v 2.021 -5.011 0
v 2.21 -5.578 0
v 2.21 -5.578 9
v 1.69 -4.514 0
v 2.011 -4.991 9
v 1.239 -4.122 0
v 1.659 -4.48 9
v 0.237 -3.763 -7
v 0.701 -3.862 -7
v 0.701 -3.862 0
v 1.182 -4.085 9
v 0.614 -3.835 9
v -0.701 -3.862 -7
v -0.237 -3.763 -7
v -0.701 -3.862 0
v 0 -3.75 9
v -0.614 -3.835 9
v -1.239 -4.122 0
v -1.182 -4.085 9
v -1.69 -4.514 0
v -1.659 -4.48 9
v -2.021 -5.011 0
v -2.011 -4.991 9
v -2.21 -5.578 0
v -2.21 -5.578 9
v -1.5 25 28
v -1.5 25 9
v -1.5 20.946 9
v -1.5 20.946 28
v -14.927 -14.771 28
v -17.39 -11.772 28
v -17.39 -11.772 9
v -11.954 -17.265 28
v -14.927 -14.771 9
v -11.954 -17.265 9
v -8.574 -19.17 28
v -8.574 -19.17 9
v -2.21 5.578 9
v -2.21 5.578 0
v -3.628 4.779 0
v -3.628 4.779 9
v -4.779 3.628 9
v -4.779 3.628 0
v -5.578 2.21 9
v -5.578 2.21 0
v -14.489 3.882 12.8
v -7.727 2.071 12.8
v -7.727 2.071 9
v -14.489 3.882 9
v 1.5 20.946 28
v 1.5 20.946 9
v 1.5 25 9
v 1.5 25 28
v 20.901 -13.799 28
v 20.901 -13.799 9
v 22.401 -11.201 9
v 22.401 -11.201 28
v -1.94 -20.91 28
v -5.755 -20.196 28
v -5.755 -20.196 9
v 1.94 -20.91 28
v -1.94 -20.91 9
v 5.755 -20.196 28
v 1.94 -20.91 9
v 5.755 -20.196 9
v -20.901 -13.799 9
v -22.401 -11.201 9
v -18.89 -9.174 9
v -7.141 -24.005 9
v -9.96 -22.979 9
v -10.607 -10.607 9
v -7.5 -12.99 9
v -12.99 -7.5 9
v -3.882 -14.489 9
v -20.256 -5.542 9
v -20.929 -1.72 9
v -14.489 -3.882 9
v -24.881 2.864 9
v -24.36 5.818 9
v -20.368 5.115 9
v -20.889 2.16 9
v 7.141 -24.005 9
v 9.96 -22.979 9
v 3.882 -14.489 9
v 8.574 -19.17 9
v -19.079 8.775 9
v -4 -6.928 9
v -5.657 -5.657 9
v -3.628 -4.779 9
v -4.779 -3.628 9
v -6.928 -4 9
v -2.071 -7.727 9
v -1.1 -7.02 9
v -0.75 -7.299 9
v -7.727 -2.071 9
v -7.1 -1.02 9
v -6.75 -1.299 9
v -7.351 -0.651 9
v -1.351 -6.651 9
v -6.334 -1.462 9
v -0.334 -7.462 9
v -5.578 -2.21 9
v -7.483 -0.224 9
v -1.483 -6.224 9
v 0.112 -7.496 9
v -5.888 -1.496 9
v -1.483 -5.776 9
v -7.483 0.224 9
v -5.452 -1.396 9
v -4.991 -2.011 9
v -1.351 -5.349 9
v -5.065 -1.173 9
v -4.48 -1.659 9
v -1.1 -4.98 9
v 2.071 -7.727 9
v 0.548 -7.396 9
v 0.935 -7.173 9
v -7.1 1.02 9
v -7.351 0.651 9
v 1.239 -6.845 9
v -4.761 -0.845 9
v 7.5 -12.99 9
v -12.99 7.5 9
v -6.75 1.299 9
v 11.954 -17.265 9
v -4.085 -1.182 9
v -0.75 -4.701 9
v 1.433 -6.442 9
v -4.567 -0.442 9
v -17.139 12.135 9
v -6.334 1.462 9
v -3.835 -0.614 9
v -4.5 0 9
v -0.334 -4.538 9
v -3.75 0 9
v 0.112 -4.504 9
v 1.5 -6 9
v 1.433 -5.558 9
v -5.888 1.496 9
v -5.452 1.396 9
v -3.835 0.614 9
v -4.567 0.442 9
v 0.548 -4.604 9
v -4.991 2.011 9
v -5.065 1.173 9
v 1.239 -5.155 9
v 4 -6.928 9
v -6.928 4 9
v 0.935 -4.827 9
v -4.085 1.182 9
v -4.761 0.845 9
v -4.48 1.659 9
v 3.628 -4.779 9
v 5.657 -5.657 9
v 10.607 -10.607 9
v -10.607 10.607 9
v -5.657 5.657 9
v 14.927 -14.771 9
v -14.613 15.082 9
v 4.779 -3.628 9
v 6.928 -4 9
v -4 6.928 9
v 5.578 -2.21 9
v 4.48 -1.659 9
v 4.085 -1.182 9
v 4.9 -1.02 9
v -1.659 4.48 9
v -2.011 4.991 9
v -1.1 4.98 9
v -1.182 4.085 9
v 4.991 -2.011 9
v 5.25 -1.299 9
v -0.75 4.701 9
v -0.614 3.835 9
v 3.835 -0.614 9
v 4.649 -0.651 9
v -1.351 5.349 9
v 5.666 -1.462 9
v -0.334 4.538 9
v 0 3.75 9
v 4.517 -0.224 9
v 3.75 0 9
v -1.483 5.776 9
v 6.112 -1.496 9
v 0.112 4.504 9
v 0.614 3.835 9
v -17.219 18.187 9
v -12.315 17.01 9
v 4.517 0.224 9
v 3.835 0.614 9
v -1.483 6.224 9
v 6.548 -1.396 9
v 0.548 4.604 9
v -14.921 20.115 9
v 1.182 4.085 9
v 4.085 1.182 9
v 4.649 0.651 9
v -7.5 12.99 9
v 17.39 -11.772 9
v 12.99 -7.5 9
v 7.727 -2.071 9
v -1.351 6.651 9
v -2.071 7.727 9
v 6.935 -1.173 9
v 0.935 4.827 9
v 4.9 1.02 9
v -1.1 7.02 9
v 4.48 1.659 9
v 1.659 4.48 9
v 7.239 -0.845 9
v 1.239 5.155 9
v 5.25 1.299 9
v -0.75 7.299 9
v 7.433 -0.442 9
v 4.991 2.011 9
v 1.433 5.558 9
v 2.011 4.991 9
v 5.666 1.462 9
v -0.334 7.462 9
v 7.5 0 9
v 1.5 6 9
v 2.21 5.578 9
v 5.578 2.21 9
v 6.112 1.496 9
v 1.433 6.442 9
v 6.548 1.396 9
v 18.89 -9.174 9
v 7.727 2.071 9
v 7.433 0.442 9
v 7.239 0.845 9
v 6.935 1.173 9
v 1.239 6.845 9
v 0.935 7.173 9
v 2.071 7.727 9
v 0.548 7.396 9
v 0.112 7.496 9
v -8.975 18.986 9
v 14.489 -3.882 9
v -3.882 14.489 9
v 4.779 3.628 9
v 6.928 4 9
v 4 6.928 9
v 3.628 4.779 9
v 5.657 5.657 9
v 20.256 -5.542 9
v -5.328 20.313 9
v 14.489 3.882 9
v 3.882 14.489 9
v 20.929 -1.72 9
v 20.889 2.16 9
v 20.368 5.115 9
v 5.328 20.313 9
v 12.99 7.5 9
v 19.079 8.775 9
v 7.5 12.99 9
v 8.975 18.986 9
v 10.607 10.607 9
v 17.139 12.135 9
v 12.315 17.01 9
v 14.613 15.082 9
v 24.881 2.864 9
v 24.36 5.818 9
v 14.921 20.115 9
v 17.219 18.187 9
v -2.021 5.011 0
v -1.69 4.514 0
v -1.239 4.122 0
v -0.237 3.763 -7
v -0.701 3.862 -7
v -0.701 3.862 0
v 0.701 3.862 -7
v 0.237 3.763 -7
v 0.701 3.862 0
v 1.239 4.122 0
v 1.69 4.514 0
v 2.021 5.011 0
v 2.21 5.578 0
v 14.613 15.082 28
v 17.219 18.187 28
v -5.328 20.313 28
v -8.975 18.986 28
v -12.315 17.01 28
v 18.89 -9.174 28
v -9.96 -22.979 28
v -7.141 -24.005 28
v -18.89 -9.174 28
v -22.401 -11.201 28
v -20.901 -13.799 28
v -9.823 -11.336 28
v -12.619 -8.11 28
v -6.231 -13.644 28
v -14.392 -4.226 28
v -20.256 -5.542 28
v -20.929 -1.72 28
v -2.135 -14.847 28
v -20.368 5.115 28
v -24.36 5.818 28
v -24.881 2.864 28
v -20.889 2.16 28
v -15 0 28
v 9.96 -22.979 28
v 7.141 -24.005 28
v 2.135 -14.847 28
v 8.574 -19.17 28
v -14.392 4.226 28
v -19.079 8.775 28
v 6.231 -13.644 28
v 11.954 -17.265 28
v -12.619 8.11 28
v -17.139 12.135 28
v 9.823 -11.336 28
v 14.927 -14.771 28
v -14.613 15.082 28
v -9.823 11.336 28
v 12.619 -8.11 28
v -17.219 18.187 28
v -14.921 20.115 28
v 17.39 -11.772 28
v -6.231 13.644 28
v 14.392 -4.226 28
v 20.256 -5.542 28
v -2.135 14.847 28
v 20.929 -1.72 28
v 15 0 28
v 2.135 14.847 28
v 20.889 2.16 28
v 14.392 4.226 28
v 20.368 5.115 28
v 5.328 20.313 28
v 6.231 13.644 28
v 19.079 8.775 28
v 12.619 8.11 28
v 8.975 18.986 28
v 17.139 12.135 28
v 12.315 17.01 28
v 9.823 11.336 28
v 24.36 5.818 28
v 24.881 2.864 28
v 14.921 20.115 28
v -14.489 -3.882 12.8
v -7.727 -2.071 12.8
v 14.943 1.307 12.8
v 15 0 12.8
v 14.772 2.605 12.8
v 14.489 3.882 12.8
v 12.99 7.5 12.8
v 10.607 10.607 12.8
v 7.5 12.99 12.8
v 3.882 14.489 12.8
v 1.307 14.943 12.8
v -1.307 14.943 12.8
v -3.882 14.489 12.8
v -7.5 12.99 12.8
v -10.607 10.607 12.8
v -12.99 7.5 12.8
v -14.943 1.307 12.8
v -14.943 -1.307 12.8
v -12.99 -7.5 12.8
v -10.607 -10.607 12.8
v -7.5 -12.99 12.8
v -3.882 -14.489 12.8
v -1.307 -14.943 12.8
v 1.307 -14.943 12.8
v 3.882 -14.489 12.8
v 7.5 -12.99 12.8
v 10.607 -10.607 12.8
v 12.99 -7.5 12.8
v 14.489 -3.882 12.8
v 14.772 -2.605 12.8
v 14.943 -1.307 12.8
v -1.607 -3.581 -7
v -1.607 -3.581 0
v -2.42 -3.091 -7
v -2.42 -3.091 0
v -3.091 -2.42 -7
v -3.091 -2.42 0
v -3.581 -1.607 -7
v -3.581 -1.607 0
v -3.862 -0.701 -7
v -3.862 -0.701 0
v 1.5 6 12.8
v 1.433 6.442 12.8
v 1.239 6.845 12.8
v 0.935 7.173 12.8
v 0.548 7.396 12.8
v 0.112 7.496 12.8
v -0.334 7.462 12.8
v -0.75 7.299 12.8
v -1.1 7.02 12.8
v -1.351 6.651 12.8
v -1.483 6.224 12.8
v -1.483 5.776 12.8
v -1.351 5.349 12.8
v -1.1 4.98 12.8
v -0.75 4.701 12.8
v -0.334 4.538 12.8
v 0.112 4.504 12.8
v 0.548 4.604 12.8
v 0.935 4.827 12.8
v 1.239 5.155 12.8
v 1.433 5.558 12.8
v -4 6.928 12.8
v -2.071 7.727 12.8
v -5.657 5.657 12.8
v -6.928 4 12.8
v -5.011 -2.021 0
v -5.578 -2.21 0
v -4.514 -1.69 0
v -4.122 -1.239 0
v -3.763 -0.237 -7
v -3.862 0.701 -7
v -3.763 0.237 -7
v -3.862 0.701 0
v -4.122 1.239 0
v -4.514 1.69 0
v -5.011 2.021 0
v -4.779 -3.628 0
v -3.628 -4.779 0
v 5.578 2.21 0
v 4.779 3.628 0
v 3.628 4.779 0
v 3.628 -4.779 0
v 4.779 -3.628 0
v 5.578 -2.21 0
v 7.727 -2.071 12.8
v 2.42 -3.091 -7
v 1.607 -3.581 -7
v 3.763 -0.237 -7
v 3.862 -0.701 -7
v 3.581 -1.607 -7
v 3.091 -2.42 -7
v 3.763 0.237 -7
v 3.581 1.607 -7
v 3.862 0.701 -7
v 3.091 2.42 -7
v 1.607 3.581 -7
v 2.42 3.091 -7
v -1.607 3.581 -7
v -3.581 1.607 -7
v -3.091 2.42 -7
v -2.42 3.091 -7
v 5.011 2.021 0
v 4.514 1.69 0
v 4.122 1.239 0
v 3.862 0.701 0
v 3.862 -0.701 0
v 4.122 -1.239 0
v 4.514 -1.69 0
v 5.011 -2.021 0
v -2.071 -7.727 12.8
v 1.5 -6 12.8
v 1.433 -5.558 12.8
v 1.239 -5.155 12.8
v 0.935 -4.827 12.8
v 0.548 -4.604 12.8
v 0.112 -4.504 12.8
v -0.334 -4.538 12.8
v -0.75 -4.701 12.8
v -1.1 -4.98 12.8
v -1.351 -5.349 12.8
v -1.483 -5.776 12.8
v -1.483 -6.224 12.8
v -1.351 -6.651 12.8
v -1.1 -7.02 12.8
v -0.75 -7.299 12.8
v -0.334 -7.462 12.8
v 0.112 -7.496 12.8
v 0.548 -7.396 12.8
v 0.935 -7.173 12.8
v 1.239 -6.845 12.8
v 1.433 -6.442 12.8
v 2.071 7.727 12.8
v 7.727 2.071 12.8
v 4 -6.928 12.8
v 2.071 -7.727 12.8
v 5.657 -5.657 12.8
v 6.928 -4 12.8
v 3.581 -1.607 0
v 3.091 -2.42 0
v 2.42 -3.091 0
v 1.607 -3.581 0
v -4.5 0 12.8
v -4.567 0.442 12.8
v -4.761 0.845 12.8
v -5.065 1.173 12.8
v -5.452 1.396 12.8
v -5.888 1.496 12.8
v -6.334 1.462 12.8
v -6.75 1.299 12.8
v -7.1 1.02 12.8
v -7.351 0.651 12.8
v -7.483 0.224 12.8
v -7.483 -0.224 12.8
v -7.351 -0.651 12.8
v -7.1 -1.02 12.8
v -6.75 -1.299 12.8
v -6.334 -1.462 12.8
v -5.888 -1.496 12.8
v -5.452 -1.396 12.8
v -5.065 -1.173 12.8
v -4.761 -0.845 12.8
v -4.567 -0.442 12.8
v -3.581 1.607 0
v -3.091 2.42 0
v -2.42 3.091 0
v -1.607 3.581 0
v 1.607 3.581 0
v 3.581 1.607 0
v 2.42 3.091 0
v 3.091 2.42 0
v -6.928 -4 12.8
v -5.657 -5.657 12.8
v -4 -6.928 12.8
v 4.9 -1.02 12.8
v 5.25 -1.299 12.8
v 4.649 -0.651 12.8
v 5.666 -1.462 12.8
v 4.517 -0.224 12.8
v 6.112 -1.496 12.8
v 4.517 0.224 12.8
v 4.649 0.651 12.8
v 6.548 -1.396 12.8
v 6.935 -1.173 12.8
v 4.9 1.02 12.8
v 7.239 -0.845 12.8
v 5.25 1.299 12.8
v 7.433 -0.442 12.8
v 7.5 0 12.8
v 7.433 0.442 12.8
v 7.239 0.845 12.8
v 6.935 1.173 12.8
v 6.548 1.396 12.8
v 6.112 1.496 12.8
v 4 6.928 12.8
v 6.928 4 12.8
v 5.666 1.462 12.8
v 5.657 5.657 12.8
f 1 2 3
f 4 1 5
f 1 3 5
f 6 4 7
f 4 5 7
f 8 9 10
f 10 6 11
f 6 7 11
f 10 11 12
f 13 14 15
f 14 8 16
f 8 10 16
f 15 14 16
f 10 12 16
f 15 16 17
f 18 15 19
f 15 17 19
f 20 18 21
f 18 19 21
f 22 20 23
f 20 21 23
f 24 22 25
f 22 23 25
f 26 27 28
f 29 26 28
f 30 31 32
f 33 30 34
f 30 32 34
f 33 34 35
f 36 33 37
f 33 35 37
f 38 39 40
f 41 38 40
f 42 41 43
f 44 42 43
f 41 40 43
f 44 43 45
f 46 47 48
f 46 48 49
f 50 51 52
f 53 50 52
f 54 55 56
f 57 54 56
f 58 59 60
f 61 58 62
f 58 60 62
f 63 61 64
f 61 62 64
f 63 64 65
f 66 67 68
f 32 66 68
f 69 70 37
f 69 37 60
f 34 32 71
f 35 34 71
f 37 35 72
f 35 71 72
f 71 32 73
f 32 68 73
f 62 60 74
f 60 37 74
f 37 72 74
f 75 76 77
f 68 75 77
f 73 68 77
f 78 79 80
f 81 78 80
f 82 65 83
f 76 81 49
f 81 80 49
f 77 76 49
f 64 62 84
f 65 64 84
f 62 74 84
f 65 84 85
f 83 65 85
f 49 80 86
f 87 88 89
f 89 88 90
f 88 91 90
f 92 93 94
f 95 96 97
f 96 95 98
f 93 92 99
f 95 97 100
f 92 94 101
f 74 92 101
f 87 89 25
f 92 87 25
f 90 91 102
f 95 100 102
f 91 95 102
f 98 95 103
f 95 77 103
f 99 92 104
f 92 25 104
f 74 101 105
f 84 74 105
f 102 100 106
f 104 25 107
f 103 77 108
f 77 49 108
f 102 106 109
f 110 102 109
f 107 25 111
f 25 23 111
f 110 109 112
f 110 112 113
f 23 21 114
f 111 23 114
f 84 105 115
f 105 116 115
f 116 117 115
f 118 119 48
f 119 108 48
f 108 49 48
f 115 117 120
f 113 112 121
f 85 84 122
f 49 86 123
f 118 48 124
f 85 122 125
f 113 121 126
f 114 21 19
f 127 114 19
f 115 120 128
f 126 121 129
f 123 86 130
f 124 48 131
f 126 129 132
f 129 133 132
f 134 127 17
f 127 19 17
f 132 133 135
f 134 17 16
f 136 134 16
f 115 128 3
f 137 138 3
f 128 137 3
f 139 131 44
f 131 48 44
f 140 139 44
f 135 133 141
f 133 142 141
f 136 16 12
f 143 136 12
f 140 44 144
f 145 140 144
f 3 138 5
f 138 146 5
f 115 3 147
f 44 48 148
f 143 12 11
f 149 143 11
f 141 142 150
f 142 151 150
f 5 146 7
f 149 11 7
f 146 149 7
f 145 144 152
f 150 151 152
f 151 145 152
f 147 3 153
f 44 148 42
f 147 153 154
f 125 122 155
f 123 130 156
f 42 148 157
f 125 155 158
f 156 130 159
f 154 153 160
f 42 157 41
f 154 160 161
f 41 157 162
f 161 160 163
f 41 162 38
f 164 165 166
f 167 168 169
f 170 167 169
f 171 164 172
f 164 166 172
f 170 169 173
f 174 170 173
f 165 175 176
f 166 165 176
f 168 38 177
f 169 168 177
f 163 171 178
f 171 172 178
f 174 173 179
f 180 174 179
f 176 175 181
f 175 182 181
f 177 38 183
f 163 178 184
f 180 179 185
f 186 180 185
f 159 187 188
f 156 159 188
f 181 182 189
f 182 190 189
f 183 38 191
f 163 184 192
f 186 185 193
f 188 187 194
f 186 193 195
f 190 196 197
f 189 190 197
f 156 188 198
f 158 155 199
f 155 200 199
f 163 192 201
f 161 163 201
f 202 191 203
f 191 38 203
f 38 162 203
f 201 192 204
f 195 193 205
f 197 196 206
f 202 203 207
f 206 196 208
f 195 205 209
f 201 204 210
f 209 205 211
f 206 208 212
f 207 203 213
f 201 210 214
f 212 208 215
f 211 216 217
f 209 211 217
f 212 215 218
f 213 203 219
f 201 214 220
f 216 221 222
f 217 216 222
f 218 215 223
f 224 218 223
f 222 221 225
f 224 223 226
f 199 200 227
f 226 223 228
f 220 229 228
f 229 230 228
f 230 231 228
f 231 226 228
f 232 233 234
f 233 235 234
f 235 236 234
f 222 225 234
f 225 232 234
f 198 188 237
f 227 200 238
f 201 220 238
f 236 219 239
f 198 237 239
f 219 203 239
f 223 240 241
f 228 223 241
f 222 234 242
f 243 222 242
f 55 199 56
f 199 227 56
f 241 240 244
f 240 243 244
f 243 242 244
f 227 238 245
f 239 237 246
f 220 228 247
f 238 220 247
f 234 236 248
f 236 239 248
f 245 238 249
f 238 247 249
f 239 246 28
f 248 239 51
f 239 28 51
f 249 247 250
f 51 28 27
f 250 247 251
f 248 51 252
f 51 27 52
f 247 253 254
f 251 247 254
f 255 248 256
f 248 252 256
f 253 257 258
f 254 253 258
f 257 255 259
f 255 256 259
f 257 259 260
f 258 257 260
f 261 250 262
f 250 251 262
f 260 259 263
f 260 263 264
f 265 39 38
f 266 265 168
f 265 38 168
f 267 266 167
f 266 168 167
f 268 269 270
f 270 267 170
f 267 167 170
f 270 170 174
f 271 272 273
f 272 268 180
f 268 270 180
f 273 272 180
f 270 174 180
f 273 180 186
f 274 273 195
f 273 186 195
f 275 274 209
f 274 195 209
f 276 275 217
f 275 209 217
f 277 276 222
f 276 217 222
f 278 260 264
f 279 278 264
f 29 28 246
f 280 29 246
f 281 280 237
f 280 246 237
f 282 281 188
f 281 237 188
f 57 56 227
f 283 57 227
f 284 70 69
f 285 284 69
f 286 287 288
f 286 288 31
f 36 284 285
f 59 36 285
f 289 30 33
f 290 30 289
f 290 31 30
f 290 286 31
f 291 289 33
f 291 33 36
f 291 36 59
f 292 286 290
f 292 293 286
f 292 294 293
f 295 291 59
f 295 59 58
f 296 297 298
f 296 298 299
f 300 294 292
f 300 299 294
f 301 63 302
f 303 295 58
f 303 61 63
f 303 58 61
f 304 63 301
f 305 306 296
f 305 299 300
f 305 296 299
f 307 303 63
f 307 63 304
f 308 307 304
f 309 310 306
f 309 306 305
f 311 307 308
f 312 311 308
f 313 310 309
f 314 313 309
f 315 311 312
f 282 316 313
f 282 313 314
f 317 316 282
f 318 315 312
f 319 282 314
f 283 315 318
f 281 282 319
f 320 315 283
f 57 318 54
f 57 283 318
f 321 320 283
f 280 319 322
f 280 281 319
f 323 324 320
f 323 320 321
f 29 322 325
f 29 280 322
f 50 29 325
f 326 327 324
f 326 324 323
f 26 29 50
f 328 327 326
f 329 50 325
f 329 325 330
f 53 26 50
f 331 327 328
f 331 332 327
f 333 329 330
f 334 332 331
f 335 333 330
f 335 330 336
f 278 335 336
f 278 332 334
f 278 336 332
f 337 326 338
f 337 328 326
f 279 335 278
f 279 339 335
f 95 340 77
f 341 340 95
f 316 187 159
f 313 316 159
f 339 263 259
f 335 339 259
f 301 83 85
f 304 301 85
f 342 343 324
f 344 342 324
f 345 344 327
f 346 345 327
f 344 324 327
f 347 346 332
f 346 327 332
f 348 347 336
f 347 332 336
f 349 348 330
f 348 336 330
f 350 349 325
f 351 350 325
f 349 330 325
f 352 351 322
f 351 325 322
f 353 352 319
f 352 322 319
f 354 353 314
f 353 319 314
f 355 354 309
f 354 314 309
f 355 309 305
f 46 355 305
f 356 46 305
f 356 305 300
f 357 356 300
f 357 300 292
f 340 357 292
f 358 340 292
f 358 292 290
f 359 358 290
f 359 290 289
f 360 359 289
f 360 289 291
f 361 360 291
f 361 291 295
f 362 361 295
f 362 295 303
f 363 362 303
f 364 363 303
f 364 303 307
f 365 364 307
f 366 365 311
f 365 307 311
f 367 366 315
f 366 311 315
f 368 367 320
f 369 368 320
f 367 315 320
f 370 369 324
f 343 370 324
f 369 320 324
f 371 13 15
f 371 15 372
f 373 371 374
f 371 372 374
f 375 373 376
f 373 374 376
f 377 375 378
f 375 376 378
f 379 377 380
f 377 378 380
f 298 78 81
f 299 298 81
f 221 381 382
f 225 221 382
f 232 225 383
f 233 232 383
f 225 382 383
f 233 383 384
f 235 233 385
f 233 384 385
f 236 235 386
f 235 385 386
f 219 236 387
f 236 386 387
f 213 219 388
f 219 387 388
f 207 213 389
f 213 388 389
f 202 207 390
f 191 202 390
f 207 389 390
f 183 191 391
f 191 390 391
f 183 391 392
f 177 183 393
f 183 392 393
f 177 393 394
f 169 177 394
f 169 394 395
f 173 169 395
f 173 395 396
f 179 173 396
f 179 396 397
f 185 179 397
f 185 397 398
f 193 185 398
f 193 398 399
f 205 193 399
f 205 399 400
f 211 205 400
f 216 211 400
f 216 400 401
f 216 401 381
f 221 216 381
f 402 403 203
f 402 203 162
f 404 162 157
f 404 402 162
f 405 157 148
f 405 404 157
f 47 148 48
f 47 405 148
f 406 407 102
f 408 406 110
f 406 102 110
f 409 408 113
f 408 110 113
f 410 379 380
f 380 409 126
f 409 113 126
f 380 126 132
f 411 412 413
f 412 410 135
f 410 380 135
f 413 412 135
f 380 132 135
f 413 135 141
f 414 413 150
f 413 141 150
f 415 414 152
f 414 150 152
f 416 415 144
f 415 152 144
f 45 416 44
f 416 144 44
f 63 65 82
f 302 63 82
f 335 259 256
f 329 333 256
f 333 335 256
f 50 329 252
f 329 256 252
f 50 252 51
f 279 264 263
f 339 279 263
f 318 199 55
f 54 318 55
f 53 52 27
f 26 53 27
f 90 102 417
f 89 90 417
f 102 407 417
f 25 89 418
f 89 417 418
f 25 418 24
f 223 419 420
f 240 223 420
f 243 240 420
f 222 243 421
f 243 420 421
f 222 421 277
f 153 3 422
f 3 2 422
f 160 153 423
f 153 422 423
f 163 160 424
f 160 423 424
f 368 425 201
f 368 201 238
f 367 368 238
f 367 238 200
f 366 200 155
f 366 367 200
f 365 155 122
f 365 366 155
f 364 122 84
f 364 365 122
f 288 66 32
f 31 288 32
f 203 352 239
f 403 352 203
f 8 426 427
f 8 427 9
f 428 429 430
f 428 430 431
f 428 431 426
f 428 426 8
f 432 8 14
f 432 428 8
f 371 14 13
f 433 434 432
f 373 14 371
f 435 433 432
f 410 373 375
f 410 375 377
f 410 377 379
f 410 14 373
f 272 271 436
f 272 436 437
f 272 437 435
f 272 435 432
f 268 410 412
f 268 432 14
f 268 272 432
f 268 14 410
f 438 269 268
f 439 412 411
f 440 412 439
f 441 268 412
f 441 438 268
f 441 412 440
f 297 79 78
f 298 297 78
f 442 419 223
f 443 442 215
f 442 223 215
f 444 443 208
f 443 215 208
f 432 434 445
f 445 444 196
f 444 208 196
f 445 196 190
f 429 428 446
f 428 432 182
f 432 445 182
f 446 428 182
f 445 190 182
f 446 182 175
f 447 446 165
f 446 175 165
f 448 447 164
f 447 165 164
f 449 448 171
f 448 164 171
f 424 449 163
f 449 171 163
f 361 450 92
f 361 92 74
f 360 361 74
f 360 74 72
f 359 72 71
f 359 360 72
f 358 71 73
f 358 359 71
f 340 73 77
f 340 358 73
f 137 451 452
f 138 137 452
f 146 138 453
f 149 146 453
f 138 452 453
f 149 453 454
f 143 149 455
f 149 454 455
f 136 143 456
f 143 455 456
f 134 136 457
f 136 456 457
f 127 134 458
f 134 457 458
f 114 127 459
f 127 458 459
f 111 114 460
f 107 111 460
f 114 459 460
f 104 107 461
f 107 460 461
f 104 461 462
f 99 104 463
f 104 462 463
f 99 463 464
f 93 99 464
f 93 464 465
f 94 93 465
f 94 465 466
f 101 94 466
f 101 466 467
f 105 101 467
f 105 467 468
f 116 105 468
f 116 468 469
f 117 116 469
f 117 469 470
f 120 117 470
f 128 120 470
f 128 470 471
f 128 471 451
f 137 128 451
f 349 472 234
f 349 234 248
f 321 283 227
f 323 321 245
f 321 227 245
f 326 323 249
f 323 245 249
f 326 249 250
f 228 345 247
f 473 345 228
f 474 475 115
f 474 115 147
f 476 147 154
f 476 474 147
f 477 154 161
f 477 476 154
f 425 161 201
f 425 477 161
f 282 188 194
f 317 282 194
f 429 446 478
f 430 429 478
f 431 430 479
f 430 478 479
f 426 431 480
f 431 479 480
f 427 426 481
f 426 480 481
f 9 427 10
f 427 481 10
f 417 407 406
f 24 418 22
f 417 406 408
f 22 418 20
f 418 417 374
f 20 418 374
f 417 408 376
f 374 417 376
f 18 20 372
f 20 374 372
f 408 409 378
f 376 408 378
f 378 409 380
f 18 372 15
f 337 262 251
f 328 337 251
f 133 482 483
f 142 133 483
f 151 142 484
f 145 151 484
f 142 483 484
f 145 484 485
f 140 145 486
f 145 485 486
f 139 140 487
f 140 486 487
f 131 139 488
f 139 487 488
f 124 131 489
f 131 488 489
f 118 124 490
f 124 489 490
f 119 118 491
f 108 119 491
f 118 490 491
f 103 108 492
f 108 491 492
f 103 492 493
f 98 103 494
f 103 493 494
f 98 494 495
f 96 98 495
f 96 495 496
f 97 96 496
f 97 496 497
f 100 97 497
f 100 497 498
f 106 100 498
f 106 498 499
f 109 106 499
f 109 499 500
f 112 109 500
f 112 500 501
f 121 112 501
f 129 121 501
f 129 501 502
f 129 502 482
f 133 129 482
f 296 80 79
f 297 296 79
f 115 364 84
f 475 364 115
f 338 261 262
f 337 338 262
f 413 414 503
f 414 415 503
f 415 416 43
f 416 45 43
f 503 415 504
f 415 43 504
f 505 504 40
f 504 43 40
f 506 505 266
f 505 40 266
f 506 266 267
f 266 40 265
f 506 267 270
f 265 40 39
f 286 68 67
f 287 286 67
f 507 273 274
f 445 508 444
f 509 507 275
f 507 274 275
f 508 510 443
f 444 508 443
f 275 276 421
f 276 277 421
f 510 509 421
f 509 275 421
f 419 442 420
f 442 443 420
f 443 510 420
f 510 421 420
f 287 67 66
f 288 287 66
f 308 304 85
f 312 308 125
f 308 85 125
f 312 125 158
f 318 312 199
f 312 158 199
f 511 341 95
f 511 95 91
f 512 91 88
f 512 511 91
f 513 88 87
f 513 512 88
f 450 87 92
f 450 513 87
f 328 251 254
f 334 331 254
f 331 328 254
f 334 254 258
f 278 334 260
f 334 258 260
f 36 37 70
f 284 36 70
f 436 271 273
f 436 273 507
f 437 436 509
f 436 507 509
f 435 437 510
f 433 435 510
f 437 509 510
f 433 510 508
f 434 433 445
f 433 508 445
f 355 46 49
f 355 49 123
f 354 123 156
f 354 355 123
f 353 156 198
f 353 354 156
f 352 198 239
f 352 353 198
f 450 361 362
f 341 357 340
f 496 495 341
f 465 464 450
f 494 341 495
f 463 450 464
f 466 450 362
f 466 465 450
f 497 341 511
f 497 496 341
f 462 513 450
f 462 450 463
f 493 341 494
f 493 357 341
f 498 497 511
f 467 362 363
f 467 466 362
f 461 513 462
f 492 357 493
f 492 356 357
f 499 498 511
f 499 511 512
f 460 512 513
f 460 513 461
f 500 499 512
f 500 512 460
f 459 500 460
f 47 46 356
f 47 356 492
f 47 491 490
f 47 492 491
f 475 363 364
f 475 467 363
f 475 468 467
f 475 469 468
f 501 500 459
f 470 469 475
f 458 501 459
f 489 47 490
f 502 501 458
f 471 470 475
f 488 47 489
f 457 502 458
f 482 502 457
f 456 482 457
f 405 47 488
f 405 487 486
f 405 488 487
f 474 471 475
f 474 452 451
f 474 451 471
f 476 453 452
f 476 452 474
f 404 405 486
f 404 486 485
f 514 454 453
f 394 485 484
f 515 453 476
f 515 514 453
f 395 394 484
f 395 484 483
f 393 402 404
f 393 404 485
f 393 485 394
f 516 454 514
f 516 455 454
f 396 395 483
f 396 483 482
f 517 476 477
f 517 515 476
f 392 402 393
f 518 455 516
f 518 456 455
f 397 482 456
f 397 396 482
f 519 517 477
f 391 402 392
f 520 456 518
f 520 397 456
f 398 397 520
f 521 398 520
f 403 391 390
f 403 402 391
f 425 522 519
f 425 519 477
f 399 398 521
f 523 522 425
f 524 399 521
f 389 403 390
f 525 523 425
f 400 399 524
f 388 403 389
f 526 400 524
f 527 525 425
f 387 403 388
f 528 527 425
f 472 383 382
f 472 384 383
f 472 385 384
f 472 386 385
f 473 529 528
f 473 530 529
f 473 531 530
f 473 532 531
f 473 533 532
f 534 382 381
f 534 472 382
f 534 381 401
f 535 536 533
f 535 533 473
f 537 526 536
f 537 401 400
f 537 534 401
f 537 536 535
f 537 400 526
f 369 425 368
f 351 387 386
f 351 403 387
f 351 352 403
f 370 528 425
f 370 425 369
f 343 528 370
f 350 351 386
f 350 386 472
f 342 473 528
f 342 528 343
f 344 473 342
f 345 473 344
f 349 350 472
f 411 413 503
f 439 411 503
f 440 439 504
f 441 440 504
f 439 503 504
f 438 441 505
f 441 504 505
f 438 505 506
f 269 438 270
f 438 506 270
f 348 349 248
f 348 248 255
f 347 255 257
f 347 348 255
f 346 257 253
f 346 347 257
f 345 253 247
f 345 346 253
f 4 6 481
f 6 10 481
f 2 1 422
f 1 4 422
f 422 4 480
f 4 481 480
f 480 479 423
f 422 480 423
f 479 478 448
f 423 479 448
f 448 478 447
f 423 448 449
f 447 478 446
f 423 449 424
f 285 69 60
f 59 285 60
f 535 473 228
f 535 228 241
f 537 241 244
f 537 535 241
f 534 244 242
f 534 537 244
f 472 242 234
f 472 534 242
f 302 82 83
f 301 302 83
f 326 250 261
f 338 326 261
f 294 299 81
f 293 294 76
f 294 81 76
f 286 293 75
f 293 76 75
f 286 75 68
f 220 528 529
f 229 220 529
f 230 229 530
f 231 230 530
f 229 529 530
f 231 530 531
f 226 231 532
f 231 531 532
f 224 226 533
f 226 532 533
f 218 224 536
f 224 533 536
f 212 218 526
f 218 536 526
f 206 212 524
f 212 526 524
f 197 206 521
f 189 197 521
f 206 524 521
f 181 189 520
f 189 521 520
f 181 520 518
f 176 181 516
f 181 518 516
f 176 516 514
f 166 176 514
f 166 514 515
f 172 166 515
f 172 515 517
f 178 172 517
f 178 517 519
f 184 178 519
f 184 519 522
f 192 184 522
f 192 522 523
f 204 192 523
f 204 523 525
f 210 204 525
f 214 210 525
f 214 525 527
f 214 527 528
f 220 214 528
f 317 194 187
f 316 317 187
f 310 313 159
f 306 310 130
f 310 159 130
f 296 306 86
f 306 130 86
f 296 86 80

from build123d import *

# Parameters (mm, degrees)
SKIZZE1_R                       = 6
AUFSATZ_LINEAR_AUSTRAGEN1_DEPTH = 9
SKIZZE2_R                       = 3.925
AUFSATZ_LINEAR_AUSTRAGEN2_DEPTH = 7
SKIZZE3_R                       = 21
AUFSATZ_LINEAR_AUSTRAGEN3_DEPTH = 19
SKIZZE4_R                       = 15
SCHNITT_LINEAR_AUSTRAGEN2_DEPTH = 15.2
AUFSATZ_LINEAR_START            = -19
AUFSATZ_LINEAR_AUSTRAGEN4_DEPTH = 19
KREISMUSTER1_COUNT              = 9
SKETCH1_R                       = 1.5
CUT_EXTRUDE1_DEPTH              = 41.448579025
CUT_EXTRUDE2_START              = -3.8
SKETCH2_R                       = 2.25
CUT_EXTRUDE2_DEPTH              = 37.648579025
CUT_EXTRUDE3_START              = -3.8
CUT_EXTRUDE3_DEPTH              = 3.8


# Read off the part's stored shape, not the designer's step: Cut-Extrude3
with BuildPart() as part:
    # Skizze1 → Aufsatz-Linear austragen1 (new body)
    with BuildSketch(Plane.XY):
        Circle(SKIZZE1_R)
    extrude(amount=AUFSATZ_LINEAR_AUSTRAGEN1_DEPTH)

    # Skizze2 → Aufsatz-Linear austragen2 (add)
    with BuildSketch(Plane(origin=(0, 0, 0), x_dir=(-1, 0, 0), z_dir=(0, 0, -1))):
        Circle(SKIZZE2_R)
    extrude(amount=AUFSATZ_LINEAR_AUSTRAGEN2_DEPTH)

    # Skizze3 → Aufsatz-Linear austragen3 (add)
    with BuildSketch(Plane.XY.offset(9)):
        Circle(SKIZZE3_R)
    extrude(amount=AUFSATZ_LINEAR_AUSTRAGEN3_DEPTH)

    # Skizze4 → Schnitt-Linear austragen2 (cut)
    with BuildSketch(Plane.XY.offset(28)):
        Circle(SKIZZE4_R)
    extrude(amount=-SCHNITT_LINEAR_AUSTRAGEN2_DEPTH, mode=Mode.SUBTRACT)

    # Skizze6 → Aufsatz-Linear austragen4 (add)
    with BuildSketch(Plane.XY.offset(28).offset(AUFSATZ_LINEAR_START)):
        with BuildLine():
            Line((1.5, 25), (-1.5, 25))
            Line((-1.5, 25), (-1.5, 20.946360066))
            ThreePointArc((-1.5, 20.946360066), (0, 21), (1.5, 20.946360066))
            Line((1.5, 20.946360066), (1.5, 25))
        make_face()
    aufsatz_linear_austragen4 = extrude(amount=AUFSATZ_LINEAR_AUSTRAGEN4_DEPTH)

    # Kreismuster1: Aufsatz-Linear austragen4 ×9 about axis
    kreismuster1_axis = Axis((0, 0, 0), (0, 0, 1))
    for i in range(1, KREISMUSTER1_COUNT):
        add(aufsatz_linear_austragen4.rotate(kreismuster1_axis, i * 360 / KREISMUSTER1_COUNT))

    # Sketch1 → Cut-Extrude1 (cut, through all)
    with BuildSketch(Plane.XY.offset(12.8)):
        with Locations((-6, 0)):
            Circle(SKETCH1_R)
        with Locations((0, 6)):
            Circle(SKETCH1_R)
        with Locations((6, 0)):
            Circle(SKETCH1_R)
        with Locations((0, -6)):
            Circle(SKETCH1_R)
    extrude(amount=-CUT_EXTRUDE1_DEPTH, mode=Mode.SUBTRACT)

    # Sketch2 → Cut-Extrude2 (cut, through all)
    with BuildSketch(Plane.XY.offset(12.8).offset(CUT_EXTRUDE2_START)):
        with Locations((0, 6)):
            Circle(SKETCH2_R)
        with Locations((6, 0)):
            Circle(SKETCH2_R)
        with Locations((0, -6)):
            Circle(SKETCH2_R)
        with Locations((-6, 0)):
            Circle(SKETCH2_R)
    extrude(amount=-CUT_EXTRUDE2_DEPTH, mode=Mode.SUBTRACT)

    # Cut-Extrude3 outline → Cut-Extrude3 (cut)
    with BuildSketch(Plane(origin=(0, 0, 9), x_dir=(-1, 0, 0), z_dir=(0, 0, -1)).offset(CUT_EXTRUDE3_START)):
        with BuildLine():
            Line((7.72740661, 2.070552361), (14.488887394, 3.882285677))
            ThreePointArc((14.488887394, 3.882285677), (10.606601718, 10.606601718), (3.882285677, 14.488887394))
            Line((3.882285677, 14.488887394), (2.070552361, 7.72740661))
            ThreePointArc((2.070552361, 7.72740661), (5.656854249, 5.656854249), (7.72740661, 2.070552361))
        make_face()
        with BuildLine():
            ThreePointArc((3.882285677, -14.488887394), (10.606601718, -10.606601718), (14.488887394, -3.882285677))
            Line((14.488887394, -3.882285677), (7.72740661, -2.070552361))
            ThreePointArc((7.72740661, -2.070552361), (5.656854249, -5.656854249), (2.070552361, -7.72740661))
            Line((2.070552361, -7.72740661), (3.882285677, -14.488887394))
        make_face()
        with BuildLine():
            Line((-2.070552361, 7.72740661), (-3.882285677, 14.488887394))
            ThreePointArc((-3.882285677, 14.488887394), (-10.606601718, 10.606601718), (-14.488887394, 3.882285677))
            Line((-14.488887394, 3.882285677), (-7.72740661, 2.070552361))
            ThreePointArc((-7.72740661, 2.070552361), (-5.656854249, 5.656854249), (-2.070552361, 7.72740661))
        make_face()
        with BuildLine():
            ThreePointArc((-14.488887394, -3.882285677), (-10.606601718, -10.606601718), (-3.882285677, -14.488887394))
            Line((-3.882285677, -14.488887394), (-2.070552361, -7.72740661))
            ThreePointArc((-2.070552361, -7.72740661), (-5.656854249, -5.656854249), (-7.72740661, -2.070552361))
            Line((-7.72740661, -2.070552361), (-14.488887394, -3.882285677))
        make_face()
    extrude(amount=CUT_EXTRUDE3_DEPTH, mode=Mode.SUBTRACT)


solid = part.part
